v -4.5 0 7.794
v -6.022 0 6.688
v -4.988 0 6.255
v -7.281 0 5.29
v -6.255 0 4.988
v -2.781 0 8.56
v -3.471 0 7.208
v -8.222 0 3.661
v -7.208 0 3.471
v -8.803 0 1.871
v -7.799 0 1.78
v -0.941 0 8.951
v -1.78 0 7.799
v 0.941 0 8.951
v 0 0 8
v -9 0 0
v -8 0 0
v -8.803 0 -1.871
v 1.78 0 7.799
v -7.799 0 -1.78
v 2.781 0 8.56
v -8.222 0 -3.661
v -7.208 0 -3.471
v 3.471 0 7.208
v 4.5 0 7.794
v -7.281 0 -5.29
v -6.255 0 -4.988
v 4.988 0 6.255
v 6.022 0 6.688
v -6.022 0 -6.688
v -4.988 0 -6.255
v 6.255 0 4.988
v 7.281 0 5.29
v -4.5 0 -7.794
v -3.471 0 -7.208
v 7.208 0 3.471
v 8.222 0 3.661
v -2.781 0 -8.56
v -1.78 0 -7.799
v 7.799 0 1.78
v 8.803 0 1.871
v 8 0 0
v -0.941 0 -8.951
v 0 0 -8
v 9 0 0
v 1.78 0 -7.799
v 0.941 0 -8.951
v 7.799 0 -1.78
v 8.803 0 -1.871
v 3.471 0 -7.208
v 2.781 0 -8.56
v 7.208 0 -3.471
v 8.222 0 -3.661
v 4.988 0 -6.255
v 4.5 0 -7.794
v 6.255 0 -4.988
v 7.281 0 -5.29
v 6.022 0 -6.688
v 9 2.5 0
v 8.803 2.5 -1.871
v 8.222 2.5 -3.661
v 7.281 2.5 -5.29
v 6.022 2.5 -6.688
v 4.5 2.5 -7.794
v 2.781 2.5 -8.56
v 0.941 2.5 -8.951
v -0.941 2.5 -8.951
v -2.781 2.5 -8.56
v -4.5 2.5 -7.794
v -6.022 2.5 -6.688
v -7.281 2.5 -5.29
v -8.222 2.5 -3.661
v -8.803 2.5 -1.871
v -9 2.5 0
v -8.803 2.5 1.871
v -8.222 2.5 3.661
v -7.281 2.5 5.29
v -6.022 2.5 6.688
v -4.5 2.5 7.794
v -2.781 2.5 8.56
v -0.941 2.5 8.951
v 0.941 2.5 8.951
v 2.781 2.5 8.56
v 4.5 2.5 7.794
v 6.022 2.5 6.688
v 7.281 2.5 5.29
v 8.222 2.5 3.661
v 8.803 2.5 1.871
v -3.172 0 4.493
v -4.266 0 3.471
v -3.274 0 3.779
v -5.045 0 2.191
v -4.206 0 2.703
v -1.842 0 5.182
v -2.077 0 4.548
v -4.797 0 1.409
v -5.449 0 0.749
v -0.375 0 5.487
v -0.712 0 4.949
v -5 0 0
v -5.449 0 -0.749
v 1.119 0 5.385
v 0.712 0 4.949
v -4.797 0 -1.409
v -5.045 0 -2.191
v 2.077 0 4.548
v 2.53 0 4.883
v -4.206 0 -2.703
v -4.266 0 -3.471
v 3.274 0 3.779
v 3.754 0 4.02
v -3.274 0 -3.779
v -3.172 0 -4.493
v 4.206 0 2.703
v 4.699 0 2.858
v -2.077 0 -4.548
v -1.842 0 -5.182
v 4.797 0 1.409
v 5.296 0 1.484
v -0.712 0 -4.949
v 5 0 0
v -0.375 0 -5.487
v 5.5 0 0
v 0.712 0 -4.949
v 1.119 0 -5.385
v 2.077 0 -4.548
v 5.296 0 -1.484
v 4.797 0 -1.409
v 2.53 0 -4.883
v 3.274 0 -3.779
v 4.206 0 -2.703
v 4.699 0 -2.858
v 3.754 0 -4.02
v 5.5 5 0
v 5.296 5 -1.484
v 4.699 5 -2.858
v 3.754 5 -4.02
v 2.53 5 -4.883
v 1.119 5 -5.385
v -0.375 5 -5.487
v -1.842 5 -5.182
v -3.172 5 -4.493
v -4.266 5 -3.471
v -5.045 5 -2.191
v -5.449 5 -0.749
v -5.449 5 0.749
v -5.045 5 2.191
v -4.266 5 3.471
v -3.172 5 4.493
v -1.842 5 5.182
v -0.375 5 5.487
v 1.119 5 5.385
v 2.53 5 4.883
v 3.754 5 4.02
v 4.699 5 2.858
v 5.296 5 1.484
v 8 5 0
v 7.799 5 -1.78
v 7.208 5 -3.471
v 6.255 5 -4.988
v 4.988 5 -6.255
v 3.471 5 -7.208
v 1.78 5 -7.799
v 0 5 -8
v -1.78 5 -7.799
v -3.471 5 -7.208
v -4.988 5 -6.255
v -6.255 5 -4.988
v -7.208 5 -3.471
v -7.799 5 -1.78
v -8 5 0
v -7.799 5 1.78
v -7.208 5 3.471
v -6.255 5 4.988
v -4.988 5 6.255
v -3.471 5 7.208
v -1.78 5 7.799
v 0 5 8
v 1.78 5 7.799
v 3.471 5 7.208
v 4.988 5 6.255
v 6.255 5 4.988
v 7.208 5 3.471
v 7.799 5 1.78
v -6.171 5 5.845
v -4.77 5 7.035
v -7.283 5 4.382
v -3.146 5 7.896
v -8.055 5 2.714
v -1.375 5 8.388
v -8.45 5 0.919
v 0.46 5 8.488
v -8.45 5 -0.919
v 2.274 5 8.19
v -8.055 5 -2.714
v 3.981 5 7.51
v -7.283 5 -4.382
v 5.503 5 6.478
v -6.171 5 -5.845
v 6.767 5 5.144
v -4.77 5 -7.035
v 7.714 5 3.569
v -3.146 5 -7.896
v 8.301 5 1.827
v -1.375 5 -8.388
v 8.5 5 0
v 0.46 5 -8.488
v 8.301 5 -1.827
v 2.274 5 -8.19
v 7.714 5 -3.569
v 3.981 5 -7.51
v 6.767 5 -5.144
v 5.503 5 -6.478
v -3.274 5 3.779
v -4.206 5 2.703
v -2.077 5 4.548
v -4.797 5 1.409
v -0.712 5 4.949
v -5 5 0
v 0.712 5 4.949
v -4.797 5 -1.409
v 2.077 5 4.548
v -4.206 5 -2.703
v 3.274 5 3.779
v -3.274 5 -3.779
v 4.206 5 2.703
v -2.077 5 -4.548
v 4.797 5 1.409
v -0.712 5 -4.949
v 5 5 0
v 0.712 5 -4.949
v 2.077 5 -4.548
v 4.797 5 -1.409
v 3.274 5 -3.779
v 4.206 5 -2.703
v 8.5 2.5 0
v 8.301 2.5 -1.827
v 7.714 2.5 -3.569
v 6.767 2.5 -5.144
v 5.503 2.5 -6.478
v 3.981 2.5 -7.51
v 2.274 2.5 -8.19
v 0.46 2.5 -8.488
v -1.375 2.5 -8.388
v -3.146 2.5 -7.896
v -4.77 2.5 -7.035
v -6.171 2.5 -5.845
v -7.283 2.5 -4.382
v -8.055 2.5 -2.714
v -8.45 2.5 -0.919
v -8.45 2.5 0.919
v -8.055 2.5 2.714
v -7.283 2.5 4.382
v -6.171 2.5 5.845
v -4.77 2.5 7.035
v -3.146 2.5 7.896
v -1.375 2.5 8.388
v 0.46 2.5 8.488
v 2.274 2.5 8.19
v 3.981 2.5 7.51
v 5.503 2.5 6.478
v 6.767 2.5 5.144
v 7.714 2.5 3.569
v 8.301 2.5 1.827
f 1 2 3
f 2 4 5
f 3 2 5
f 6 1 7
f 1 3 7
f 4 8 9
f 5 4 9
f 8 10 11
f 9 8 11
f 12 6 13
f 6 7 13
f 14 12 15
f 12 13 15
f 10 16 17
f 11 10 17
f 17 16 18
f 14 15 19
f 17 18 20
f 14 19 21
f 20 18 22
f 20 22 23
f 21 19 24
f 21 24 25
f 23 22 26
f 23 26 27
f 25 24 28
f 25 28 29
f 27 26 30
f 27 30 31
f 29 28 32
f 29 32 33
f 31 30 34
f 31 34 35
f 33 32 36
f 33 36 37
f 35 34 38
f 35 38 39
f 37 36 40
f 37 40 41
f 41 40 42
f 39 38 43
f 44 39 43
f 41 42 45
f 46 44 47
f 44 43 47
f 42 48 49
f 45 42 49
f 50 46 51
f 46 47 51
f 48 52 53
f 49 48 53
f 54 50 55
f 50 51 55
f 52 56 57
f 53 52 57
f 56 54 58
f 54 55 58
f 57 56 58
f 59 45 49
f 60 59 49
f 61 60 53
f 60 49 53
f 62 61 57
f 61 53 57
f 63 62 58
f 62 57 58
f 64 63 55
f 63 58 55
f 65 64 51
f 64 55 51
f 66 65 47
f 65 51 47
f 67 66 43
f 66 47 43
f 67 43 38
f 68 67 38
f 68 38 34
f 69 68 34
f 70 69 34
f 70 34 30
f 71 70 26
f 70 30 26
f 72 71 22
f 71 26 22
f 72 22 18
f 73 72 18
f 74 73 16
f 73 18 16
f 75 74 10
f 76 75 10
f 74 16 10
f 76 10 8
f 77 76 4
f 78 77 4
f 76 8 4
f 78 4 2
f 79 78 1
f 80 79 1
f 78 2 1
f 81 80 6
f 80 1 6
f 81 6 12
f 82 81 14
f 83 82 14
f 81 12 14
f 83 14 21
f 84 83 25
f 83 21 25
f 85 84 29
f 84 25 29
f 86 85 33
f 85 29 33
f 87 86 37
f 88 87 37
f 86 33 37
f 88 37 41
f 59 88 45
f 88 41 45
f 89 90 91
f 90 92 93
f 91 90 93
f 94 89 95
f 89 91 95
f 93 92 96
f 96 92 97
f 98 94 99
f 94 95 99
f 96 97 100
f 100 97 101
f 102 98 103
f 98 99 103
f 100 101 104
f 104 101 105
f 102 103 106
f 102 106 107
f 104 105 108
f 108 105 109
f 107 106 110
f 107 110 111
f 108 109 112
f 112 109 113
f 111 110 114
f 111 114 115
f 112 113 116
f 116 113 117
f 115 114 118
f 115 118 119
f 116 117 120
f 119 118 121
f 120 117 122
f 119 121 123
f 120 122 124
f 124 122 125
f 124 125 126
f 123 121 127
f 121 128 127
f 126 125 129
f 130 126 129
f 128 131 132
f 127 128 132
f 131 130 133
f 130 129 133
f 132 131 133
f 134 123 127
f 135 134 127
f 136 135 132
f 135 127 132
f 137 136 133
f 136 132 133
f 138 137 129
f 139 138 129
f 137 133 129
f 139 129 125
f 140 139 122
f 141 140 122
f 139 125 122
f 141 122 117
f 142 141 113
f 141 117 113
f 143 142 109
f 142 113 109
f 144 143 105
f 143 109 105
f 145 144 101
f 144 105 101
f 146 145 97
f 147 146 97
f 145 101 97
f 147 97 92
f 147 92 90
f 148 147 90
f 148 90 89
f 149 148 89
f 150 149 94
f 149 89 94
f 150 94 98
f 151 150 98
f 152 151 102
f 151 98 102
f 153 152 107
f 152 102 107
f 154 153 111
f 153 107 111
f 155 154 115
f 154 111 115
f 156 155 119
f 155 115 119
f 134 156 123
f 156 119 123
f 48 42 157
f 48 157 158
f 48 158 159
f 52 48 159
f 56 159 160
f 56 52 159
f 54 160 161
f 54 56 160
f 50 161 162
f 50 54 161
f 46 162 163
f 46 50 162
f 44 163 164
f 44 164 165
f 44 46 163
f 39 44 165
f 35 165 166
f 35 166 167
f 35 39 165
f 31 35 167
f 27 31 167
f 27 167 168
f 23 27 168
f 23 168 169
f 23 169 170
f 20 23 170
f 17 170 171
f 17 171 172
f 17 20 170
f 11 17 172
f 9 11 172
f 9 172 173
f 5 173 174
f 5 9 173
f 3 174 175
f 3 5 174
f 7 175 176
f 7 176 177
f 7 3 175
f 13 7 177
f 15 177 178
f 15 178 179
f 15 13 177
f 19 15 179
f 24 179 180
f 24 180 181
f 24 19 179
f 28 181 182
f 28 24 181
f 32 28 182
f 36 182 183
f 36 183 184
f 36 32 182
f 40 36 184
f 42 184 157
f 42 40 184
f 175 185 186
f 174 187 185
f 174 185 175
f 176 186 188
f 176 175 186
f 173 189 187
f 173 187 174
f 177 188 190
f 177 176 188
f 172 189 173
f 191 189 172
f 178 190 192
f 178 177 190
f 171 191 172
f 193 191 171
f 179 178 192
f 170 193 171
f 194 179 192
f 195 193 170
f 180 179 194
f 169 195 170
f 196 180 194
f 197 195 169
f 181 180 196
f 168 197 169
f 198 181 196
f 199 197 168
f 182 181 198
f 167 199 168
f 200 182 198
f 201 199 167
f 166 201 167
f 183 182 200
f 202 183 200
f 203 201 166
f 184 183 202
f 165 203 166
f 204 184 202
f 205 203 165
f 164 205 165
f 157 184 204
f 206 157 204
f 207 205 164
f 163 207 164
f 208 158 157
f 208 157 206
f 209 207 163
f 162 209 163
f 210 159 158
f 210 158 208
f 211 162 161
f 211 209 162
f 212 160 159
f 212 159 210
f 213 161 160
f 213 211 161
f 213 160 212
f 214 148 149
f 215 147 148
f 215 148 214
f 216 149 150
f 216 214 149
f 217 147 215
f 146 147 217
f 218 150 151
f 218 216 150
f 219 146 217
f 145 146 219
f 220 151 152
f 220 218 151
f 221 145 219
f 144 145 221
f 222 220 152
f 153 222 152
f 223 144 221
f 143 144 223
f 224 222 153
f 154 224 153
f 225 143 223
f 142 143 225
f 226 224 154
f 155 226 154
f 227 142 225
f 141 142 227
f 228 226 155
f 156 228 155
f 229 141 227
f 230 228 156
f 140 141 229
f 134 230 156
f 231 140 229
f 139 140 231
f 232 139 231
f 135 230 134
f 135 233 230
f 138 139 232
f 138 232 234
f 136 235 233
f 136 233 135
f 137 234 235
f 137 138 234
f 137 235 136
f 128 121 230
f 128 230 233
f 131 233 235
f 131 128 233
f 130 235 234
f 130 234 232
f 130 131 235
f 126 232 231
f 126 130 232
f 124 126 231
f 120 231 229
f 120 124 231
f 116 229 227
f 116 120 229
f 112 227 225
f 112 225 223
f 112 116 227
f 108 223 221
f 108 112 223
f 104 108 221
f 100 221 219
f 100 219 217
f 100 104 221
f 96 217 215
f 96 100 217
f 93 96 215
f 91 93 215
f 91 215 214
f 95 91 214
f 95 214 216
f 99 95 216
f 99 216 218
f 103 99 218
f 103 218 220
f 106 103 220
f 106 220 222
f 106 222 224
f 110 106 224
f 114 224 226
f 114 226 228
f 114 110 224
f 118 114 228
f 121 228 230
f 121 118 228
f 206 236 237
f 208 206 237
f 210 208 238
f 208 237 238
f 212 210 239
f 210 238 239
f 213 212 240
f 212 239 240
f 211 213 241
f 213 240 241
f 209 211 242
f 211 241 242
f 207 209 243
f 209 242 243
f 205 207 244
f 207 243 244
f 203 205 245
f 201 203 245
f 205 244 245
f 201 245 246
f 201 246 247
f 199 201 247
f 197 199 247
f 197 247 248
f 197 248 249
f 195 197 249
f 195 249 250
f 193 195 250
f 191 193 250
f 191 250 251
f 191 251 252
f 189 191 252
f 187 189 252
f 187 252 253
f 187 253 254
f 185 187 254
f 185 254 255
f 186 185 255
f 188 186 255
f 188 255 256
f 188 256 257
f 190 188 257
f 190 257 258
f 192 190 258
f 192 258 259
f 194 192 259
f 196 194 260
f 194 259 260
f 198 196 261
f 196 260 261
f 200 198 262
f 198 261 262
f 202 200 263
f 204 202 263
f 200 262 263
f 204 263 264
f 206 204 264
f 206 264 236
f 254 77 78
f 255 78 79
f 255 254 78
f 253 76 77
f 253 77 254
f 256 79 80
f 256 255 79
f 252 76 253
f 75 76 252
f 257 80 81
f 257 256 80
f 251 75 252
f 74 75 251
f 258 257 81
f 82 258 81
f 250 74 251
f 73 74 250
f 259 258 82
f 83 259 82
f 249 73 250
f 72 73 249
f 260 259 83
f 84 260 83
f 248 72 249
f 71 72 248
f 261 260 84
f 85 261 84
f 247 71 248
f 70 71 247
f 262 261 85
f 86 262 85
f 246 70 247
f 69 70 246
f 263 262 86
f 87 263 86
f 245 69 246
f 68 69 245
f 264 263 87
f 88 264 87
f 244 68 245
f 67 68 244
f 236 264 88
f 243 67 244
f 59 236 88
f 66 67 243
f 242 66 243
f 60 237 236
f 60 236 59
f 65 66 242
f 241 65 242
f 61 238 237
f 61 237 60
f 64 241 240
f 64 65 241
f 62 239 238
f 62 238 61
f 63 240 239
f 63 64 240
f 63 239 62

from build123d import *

# Parameters (mm, degrees)
SKETCH1_R             = 5.5
SKETCH1_R_2           = 5
BOSS_EXTRUDE1_DEPTH   = 5
SKETCH1_R_3           = 8.5
SKETCH1_R_4           = 8
BOSS_EXTRUDE1_2_DEPTH = 5
SKETCH2_R             = 9
SKETCH2_R_2           = 8.5
BOSS_EXTRUDE3_DEPTH   = 2.5


with BuildPart() as part:
    # Sketch1 → Boss-Extrude1 (new body)
    with BuildSketch(Plane(origin=(0, 0, 0), x_dir=(1, 0, 0), z_dir=(0, 1, 0))):
        Circle(SKETCH1_R)
        Circle(SKETCH1_R_2, mode=Mode.SUBTRACT)
    extrude(amount=BOSS_EXTRUDE1_DEPTH)


with BuildPart() as body_2:
    # Sketch1 → Boss-Extrude1 2 (new body)
    with BuildSketch(Plane(origin=(0, 0, 0), x_dir=(1, 0, 0), z_dir=(0, 1, 0))):
        Circle(SKETCH1_R_3)
        Circle(SKETCH1_R_4, mode=Mode.SUBTRACT)
    extrude(amount=BOSS_EXTRUDE1_2_DEPTH)

    # Sketch2 → Boss-Extrude3 (add)
    with BuildSketch(Plane(origin=(0, 0, 0), x_dir=(1, 0, 0), z_dir=(0, 1, 0))):
        Circle(SKETCH2_R)
        Circle(SKETCH2_R_2, mode=Mode.SUBTRACT)
    extrude(amount=BOSS_EXTRUDE3_DEPTH)


solid = Compound([part.part, body_2.part])
